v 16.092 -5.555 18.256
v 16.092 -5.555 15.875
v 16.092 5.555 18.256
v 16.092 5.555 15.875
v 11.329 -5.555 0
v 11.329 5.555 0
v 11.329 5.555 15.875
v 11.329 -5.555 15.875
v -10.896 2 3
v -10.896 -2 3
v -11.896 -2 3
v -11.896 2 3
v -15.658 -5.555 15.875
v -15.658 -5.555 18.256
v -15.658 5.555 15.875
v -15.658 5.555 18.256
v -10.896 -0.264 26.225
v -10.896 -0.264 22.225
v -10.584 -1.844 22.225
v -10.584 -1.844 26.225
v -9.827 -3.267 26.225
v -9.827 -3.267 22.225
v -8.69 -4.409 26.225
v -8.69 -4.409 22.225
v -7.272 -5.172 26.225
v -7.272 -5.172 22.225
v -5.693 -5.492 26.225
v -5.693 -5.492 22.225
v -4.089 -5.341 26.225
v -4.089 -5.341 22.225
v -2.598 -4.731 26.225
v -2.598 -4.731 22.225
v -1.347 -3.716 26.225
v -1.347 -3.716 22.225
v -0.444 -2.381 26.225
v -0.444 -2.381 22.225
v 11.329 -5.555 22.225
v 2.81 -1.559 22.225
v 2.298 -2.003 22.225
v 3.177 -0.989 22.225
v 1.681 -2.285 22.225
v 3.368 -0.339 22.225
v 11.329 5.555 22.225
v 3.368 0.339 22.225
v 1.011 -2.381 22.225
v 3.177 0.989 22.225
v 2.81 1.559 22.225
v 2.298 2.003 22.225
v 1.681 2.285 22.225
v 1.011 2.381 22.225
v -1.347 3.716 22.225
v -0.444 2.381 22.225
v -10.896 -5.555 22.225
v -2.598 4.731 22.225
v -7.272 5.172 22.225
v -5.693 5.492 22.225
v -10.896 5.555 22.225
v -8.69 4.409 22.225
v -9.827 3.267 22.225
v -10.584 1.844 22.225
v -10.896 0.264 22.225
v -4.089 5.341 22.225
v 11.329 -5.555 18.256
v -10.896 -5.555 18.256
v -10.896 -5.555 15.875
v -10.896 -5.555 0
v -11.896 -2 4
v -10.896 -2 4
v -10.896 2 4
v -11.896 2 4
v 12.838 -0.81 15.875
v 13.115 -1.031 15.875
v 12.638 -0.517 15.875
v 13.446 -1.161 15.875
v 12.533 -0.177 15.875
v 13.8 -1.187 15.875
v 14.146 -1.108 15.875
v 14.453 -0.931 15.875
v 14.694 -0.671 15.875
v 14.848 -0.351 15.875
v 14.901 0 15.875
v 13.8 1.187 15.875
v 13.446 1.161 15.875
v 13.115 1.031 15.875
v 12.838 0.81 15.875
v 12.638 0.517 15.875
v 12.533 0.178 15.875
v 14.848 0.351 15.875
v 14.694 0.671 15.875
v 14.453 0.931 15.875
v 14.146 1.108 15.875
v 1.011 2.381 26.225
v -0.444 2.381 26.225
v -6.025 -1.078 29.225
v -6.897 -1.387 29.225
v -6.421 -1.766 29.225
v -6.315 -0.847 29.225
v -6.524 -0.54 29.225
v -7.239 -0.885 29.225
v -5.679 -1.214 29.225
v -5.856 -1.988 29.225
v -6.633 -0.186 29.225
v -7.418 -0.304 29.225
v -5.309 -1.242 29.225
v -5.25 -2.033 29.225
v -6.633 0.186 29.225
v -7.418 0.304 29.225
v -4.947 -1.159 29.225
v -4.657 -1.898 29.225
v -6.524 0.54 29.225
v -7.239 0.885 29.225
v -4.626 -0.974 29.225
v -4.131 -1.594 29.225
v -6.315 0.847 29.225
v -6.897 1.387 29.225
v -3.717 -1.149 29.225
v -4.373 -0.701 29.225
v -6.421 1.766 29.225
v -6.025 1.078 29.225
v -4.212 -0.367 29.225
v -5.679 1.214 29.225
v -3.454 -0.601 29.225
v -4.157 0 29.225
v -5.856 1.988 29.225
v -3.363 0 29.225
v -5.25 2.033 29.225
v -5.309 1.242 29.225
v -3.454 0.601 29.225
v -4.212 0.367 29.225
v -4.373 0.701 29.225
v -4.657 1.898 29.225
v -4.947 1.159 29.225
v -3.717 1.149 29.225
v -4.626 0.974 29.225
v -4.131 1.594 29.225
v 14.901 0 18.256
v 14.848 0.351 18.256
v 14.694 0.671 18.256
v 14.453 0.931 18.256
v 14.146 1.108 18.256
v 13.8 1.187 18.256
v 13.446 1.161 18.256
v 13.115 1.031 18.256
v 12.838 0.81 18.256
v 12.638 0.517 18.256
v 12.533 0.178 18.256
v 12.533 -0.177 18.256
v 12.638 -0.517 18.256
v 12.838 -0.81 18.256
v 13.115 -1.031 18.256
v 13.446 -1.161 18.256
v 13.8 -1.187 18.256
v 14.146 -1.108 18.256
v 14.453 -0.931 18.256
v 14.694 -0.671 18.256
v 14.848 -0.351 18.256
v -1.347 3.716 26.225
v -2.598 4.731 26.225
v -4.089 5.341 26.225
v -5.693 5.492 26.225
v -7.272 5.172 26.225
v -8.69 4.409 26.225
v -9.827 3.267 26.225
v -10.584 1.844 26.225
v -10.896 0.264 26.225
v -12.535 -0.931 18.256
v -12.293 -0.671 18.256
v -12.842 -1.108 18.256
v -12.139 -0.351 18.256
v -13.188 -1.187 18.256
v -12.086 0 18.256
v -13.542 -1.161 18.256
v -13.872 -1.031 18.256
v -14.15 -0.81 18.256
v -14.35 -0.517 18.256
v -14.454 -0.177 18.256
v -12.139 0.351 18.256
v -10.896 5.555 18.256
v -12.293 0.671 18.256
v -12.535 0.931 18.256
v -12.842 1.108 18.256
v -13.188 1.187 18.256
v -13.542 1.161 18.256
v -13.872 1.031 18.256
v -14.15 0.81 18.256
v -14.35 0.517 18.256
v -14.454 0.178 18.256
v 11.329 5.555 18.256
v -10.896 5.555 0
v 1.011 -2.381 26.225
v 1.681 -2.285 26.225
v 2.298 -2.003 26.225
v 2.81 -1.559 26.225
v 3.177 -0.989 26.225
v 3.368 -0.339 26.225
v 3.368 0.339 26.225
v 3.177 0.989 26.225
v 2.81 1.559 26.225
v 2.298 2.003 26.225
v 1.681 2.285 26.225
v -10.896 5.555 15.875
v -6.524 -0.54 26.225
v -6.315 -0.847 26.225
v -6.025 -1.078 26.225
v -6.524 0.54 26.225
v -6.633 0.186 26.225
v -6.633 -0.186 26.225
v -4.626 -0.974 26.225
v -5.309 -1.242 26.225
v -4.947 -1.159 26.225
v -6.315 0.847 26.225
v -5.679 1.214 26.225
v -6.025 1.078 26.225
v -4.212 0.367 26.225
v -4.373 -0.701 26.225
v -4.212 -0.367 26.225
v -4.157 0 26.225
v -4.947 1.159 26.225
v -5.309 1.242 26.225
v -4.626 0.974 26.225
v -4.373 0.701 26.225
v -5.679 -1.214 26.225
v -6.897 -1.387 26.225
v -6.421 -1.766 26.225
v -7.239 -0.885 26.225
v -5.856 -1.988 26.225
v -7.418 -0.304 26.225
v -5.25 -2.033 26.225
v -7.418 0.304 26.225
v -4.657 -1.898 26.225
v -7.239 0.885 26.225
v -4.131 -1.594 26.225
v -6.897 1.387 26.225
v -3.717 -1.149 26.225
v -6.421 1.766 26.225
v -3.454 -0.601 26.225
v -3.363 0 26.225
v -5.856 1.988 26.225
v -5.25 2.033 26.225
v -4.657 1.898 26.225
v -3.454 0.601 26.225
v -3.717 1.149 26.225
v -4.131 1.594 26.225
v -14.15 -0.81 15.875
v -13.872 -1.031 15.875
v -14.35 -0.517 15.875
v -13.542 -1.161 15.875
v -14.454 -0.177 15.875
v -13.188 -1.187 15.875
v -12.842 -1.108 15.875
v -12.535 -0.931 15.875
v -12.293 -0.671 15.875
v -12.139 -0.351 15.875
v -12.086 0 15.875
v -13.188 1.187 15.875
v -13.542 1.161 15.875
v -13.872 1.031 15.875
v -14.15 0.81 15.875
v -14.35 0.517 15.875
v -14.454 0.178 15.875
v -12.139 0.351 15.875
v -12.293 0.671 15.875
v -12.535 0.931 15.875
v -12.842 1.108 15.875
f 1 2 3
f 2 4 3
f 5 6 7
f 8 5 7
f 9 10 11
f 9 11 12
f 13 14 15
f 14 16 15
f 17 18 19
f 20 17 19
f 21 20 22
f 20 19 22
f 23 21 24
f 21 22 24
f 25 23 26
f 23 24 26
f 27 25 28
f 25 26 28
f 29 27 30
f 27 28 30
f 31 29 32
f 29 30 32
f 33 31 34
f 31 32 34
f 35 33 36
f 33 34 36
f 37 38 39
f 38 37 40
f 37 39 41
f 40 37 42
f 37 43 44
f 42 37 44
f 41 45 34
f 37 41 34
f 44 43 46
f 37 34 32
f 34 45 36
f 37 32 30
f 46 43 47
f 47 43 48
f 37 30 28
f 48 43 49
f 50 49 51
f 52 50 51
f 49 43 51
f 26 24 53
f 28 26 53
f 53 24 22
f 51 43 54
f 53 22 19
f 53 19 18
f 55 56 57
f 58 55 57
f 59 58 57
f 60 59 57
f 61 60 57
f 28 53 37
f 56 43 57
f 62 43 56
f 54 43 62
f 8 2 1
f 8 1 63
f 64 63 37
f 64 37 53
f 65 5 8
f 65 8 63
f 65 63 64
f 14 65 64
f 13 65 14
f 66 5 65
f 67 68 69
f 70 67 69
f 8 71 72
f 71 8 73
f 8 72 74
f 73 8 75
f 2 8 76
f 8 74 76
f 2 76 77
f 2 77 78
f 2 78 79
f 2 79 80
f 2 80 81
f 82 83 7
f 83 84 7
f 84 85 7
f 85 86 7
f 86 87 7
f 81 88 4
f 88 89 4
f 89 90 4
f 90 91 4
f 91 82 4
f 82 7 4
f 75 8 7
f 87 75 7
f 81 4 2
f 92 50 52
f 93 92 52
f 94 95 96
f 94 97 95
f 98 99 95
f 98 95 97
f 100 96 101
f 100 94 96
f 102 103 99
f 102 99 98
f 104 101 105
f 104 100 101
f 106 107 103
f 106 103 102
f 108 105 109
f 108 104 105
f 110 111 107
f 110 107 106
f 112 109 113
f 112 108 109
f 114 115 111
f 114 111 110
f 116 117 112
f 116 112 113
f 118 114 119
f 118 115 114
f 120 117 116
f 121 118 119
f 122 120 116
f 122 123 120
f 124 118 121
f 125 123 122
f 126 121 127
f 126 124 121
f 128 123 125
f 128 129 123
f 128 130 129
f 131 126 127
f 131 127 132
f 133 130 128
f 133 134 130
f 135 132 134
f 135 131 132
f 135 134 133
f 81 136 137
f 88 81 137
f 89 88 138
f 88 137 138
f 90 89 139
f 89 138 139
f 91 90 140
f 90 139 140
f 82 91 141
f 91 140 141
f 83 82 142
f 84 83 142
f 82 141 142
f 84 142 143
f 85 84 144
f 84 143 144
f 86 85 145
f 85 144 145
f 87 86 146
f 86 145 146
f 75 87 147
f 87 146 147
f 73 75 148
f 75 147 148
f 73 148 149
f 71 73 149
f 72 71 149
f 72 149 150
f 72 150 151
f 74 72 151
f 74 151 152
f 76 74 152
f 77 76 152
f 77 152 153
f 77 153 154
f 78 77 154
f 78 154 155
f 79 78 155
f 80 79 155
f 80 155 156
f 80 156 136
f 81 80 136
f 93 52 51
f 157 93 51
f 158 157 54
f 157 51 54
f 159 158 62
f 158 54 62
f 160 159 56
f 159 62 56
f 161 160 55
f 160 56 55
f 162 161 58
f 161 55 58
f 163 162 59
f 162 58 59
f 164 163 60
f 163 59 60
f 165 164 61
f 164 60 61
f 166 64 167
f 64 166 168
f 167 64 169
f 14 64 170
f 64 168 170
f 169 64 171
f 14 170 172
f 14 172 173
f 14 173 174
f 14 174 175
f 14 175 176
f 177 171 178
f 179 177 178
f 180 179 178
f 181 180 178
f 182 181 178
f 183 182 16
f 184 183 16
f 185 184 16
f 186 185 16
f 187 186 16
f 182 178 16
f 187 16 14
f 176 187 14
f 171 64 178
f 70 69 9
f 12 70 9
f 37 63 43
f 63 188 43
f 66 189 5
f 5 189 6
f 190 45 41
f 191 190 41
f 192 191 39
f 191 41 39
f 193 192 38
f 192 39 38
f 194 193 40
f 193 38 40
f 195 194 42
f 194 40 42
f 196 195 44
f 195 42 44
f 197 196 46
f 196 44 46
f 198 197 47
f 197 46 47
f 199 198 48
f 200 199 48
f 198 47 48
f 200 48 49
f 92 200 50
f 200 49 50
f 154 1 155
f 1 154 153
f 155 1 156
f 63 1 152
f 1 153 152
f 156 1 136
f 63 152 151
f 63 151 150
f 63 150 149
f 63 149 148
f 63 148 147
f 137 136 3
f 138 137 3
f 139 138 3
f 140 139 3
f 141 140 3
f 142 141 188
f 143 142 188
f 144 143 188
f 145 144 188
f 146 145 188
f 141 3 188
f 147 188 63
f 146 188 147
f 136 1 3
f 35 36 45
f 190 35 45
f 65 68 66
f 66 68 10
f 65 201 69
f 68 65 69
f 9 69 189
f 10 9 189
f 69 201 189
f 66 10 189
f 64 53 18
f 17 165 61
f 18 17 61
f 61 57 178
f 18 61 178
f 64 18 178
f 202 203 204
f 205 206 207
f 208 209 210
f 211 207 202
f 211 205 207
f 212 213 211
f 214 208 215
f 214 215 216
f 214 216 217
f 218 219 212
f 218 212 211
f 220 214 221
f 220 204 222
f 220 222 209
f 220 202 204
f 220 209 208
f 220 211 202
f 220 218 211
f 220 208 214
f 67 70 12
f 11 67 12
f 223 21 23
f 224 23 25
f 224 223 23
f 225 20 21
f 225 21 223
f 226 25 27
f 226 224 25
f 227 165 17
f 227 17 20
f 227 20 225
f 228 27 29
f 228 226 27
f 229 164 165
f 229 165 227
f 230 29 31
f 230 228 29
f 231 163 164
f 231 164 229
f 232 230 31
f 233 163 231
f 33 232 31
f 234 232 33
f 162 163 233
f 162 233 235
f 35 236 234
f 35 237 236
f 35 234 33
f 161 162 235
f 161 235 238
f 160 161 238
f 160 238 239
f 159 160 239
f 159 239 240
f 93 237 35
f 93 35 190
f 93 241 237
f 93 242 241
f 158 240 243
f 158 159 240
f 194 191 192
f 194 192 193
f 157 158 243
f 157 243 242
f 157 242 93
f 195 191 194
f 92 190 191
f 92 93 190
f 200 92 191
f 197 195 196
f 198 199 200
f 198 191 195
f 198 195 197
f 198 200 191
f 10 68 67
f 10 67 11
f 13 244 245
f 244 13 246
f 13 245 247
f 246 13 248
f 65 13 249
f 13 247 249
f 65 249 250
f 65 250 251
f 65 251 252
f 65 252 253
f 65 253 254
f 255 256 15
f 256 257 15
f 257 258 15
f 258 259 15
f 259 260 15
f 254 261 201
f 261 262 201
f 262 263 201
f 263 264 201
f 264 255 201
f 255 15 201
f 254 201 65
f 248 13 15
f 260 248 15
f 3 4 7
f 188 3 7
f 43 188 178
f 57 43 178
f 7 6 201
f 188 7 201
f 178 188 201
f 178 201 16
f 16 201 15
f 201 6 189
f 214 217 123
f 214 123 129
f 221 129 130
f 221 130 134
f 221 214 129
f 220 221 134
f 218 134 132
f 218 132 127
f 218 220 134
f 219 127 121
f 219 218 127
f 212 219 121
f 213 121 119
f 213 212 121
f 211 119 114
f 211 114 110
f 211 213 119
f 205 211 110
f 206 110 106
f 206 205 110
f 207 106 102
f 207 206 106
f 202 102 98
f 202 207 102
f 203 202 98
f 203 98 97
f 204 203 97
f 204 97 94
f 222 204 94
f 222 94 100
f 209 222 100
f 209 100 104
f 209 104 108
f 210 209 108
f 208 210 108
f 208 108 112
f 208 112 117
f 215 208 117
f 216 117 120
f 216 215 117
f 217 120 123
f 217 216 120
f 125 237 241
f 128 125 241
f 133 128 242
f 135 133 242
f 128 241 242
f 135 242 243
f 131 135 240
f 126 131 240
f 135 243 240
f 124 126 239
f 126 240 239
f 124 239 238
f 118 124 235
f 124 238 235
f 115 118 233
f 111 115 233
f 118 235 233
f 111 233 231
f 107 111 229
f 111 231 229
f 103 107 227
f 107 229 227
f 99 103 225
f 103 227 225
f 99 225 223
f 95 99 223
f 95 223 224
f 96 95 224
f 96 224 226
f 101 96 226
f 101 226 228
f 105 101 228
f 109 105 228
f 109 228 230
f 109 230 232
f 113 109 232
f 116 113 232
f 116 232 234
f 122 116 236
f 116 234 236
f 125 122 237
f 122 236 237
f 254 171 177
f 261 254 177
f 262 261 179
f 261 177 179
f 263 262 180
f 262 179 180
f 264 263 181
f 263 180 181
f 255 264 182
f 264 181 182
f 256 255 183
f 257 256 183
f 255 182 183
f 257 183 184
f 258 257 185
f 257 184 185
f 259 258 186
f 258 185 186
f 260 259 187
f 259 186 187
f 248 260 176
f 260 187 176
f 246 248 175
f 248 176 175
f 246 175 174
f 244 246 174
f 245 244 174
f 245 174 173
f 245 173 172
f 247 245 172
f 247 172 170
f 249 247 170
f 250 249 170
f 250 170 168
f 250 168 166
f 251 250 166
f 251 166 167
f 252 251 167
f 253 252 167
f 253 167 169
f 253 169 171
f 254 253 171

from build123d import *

# Parameters (mm, degrees)
P_IDAT_VYSUNUT_M1_DEPTH  = 5.555
P_IDAT_VYSUNUT_M2_DEPTH  = 4
SKICA3_R                 = 2.03883748
SKICA3_R_2               = 1.24519559
P_IDAT_VYSUNUT_M3_DEPTH  = 3
SKICA5_R                 = 1.190602913
SKICA5_R_2               = 1.19060243
ODEBRAT_VYSUNUT_M1_DEPTH = 23
SKICA7_W                 = 1
SKICA7_H                 = 4
P_IDAT_VYSUNUT_M4_DEPTH  = 1


# Read off the part's stored shape, not the designer's step: Přidat vysunutím2
with BuildPart() as part:
    # Skica1 → Přidat vysunutím1 (new, symmetric)
    with BuildSketch(Plane(origin=(0, 0, 0), x_dir=(1, 0, 0), z_dir=(0, 1, 0))):
        Polygon((11.32935, -15.875), (16.09185, -15.875), (16.09185, -18.25625), (11.32935, -18.25625), (11.32935, -22.225), (-10.89565, -22.225), (-10.89565, -18.25625), (-15.65815, -18.25625), (-15.65815, -15.875), (-10.89565, -15.875), (-10.89565, 0), (11.32935, 0), align=None)
    extrude(amount=P_IDAT_VYSUNUT_M1_DEPTH, both=True)

    # Přidat vysunutím2 outline → Přidat vysunutím2 (add)
    with BuildSketch(Plane.XY.offset(22.225)):
        with BuildLine():
            Line((-10.89565, 0.263816958), (-10.89565, -0.263816958))
            ThreePointArc((-10.89565, -0.263816958), (-6.494080203, -5.390484118), (-0.444197365, -2.381256561))
            Line((-0.444197365, -2.381256561), (1.010536018, -2.381256561))
            ThreePointArc((1.010536018, -2.381256561), (3.391829299, 2.729e-06), (1.010604, 2.38133))
            Line((1.010604, 2.38133), (-0.444232639, 2.38133))
            ThreePointArc((-0.444232639, 2.38133), (-6.494120128, 5.390476029), (-10.89565, 0.263816958))
        make_face()
    extrude(amount=P_IDAT_VYSUNUT_M2_DEPTH)

    # Skica3 → Přidat vysunutím3 (add)
    with BuildSketch(Plane.XY.offset(26.225)):
        with Locations((-5.401980861, 0)):
            Circle(SKICA3_R)
        with Locations((-5.401980861, 0)):
            Circle(SKICA3_R_2, mode=Mode.SUBTRACT)
    extrude(amount=P_IDAT_VYSUNUT_M3_DEPTH)

    # Skica5 → Odebrat vysunutím1 (cut)
    with BuildSketch(Plane.XY.offset(18.25625)):
        with Locations((-13.276937552, 5.8558e-05)):
            Circle(SKICA5_R)
        with Locations((13.71053658, 6.1415e-05)):
            Circle(SKICA5_R_2)
    extrude(amount=-ODEBRAT_VYSUNUT_M1_DEPTH, mode=Mode.SUBTRACT)

    # Skica7 → Přidat vysunutím4 (add)
    with BuildSketch(Plane(origin=(-10.89565, 0, 10.89565), x_dir=(0, 0, -1), z_dir=(1, 0, 0))):
        with Locations((7.39565, 0)):
            Rectangle(SKICA7_W, SKICA7_H)
    extrude(amount=-P_IDAT_VYSUNUT_M4_DEPTH)


solid = part.part
